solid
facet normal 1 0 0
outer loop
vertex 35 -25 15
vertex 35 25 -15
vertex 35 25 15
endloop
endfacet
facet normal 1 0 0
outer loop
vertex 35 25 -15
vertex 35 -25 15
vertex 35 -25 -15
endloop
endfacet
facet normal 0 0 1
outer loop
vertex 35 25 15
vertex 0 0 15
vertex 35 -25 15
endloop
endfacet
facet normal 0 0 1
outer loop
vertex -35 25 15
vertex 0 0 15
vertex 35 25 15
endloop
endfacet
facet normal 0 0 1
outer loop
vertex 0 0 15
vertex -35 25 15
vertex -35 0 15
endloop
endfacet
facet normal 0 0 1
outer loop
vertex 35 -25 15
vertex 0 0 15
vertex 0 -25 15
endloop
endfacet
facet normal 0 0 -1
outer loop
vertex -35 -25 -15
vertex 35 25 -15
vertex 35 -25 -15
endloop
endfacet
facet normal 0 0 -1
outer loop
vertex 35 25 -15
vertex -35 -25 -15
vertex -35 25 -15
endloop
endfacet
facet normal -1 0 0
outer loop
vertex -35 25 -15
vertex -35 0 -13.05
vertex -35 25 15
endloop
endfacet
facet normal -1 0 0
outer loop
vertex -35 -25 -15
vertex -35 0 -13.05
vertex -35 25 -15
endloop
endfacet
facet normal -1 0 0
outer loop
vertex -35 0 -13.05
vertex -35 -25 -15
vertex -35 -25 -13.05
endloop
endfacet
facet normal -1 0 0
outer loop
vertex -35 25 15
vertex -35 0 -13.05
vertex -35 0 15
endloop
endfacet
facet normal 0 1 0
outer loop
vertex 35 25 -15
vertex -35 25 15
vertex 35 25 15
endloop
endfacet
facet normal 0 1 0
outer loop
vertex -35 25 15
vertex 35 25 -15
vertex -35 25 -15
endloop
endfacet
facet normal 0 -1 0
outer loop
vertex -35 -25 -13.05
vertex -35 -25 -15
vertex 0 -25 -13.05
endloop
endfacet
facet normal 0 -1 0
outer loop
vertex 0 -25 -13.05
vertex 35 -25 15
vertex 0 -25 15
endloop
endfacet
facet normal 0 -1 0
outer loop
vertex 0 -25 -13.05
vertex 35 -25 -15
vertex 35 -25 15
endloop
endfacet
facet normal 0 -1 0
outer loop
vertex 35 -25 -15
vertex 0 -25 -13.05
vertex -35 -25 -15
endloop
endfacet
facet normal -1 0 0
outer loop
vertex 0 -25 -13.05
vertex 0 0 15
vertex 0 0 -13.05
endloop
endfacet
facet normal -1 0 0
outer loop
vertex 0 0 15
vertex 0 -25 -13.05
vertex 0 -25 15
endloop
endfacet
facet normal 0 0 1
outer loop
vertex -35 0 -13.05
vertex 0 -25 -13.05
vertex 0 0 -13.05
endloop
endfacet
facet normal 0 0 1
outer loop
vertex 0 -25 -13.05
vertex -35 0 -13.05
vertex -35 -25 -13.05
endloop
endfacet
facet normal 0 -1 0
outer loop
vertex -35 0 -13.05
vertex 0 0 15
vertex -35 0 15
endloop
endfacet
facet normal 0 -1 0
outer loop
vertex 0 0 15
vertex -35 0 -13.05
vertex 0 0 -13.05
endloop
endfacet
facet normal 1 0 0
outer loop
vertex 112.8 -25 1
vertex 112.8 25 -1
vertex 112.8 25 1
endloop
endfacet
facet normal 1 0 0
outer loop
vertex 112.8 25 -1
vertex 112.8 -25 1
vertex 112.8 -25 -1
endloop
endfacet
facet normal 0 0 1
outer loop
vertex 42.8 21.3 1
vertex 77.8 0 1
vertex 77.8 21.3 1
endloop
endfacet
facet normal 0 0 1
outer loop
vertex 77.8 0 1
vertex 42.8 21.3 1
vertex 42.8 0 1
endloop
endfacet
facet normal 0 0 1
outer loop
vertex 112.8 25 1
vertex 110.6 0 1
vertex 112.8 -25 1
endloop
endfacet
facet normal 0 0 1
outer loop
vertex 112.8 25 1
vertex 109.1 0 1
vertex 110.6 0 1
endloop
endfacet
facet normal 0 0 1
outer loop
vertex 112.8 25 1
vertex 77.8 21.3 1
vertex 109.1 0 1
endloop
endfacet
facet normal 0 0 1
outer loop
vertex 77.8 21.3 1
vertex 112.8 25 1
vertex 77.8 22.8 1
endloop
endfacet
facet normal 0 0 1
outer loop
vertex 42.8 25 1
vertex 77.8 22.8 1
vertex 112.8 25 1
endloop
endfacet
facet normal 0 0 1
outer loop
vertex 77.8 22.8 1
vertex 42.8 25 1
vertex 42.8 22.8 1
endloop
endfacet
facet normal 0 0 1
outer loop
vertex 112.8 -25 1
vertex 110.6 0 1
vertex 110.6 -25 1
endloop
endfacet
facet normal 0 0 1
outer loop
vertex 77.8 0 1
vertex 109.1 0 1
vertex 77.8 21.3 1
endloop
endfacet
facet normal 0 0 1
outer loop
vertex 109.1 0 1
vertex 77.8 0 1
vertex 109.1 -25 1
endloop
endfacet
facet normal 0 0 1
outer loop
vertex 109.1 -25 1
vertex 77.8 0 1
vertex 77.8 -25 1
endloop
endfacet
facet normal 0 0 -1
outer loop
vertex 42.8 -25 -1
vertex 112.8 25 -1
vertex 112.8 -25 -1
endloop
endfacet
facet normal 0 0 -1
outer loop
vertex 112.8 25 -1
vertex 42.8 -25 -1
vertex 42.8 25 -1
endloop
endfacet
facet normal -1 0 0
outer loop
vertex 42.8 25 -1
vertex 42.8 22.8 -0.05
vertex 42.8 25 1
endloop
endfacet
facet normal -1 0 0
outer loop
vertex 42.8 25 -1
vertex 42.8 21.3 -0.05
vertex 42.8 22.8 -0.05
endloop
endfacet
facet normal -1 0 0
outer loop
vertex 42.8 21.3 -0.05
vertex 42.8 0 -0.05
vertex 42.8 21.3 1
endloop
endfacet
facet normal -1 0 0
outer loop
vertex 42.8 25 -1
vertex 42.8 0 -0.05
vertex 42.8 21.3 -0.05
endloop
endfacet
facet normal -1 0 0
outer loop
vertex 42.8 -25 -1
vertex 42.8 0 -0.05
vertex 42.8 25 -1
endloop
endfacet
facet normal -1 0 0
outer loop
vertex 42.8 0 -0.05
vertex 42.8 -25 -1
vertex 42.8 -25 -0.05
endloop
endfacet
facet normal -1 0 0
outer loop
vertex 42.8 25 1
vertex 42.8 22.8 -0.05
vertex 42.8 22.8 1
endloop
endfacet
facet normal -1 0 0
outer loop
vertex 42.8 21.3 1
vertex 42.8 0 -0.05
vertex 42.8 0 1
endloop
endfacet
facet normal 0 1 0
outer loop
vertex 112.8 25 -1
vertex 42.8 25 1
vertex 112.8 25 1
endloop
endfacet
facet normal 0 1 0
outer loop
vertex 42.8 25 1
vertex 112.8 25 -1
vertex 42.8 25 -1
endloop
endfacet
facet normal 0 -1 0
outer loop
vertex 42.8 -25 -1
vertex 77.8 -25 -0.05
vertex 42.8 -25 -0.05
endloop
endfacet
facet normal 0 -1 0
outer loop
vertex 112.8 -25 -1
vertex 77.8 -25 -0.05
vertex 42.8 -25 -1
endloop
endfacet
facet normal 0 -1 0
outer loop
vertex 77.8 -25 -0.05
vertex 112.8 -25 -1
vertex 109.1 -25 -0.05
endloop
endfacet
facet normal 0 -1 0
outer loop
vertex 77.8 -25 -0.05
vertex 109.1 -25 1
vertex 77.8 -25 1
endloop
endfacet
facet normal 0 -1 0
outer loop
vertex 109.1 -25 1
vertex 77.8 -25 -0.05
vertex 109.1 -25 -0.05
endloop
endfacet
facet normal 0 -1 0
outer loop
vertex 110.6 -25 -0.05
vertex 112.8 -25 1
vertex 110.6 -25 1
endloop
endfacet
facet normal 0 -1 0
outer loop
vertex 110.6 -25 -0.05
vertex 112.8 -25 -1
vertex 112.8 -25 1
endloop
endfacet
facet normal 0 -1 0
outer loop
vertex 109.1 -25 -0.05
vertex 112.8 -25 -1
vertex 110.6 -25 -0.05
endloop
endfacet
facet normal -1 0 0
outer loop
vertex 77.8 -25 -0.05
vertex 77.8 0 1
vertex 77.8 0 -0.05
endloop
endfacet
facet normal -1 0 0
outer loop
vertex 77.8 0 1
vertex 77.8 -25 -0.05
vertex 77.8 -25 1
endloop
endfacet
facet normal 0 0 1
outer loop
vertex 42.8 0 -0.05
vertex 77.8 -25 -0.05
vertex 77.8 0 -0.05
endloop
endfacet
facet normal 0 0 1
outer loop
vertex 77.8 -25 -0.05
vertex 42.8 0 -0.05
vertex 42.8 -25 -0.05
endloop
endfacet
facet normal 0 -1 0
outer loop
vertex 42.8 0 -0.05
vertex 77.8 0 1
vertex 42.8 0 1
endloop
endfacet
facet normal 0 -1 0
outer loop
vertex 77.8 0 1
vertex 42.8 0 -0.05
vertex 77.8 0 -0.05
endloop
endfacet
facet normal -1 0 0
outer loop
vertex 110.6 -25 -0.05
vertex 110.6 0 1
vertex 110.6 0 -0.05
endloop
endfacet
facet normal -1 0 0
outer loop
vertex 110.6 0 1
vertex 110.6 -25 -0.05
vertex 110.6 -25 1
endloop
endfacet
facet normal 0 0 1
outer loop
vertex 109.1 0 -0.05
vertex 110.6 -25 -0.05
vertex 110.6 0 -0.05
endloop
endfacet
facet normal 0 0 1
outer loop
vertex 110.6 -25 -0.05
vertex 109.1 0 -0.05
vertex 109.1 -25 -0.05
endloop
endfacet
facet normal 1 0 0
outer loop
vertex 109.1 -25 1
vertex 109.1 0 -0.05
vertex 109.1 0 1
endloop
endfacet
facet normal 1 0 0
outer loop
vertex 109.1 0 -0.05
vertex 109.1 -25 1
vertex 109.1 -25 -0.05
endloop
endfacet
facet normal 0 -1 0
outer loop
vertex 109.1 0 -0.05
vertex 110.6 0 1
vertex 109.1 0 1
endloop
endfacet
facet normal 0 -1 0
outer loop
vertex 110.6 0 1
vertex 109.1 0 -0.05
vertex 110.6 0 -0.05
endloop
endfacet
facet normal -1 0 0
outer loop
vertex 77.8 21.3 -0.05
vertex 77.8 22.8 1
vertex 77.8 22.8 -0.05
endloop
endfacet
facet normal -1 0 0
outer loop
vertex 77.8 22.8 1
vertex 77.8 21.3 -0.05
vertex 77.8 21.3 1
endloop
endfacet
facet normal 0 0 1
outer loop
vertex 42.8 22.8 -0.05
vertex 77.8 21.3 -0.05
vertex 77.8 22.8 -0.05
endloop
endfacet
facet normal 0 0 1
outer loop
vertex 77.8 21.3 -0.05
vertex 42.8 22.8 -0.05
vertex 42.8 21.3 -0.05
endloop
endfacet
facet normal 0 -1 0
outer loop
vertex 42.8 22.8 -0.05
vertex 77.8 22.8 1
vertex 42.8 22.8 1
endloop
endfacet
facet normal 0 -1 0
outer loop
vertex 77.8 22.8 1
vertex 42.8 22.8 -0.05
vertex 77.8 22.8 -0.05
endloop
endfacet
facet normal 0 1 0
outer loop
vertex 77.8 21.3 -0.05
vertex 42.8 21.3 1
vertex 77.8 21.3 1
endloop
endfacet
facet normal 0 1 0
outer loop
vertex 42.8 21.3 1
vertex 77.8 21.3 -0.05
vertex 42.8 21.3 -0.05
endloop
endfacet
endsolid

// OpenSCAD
// Two-part enclosure for small electronics board
// Part 1: Box (left)
// Part 2: Lid (right, printed upside down)
// Prints together with a 10 mm gap.

$fn = 128;

// --- Dimensions ---

// Box Dimensions (Outer)
BOX_X = 70;
BOX_Y = 50;
BOX_Z = 30;

// Wall and Floor Thickness
WALL_THICK = 2;
FLOOR_THICK = 2;

// Gap between parts
PART_GAP = 10;

// Lid Dimensions
// Plate thickness
LID_PLATE_THICK = 2;
// Lip dimensions
LIP_WALL_THICK = 1.5;
LIP_HEIGHT = 4;
// Lip outer size (matches box opening + clearance)
LIP_X_OUT = 65.6;
LIP_Y_OUT = 45.6;

// --- Helper Functions ---

// Create the Box (Part 1)
// Oriented: Rests on XY, builds +Z. Centred on origin.
module create_box() {
    // Calculate inner dimensions
    inner_x = BOX_X - 2*WALL_THICK;
    inner_y = BOX_Y - 2*WALL_THICK;
    inner_z = BOX_Z - FLOOR_THICK; // Open top

    // Build box using difference to ensure clean walls
    difference() {
        // Outer block
        cube([BOX_X, BOX_Y, BOX_Z], center = true);
        
        // Cut out the inside (open top)
        // The hole goes from z=0 to z=inner_z relative to the box center.
        // Box center Z is BOX_Z/2.
        // Hole bottom Z = BOX_Z/2 - inner_z/2 = (BOX_Z - inner_z)/2 = FLOOR_THICK/2.
        // Hole top Z = BOX_Z/2 + inner_z/2.
        
        translate([
            -inner_x/2, 
            -inner_y/2, 
            FLOOR_THICK/2
        ]) {
            cube([inner_x, inner_y, inner_z + 0.1], center = true);
        }
    }
}

// Create the Lid (Part 2)
// Oriented: Printed upside down. 
// This means the plate lies on the bed (XY), and the lip extends UPWARDS (+Z) 
// so that when flipped, the lip goes down into the box.
module create_lid() {
    // Plate dimensions
    plate_x = BOX_X;
    plate_y = BOX_Y;
    plate_z = LID_PLATE_THICK;

    // Lip dimensions (Outer)
    lip_x_out = LIP_X_OUT;
    lip_y_out = LIP_Y_OUT;
    lip_z = LIP_HEIGHT;
    lip_w = LIP_WALL_THICK;

    // Lip Inner dimensions (to match the cutout)
    lip_x_in = lip_x_out - 2*lip_w;
    lip_y_in = lip_y_out - 2*lip_w;

    difference() {
        // 1. The main plate
        cube([plate_x, plate_y, plate_z], center = true);

        // 2. The Lip (cut out from the plate volume)
        // We subtract the volume of the lip channel.
        // The channel is defined by the inner void and the side walls.
        
        // Start cutting from the top surface of the plate
        cut_z_start = plate_z;
        
        // Inner Void (the hole)
        translate([
            -lip_x_in/2, 
            -lip_y_in/2, 
            cut_z_start
        ]) {
            cube([lip_x_in, lip_y_in, lip_z + 0.1], center = true);
        }
        
        // Side Walls (Left and Right relative to X)
        // Wall 1 (Left)
        translate([
            -lip_x_out/2 - lip_w/2, 
            -lip_y_out/2, 
            cut_z_start
        ]) {
            cube([lip_w, lip_y_out, lip_z + 0.1], center = true);
        }
        // Wall 2 (Right)
        translate([
            lip_x_out/2 - lip_w/2, 
            -lip_y_out/2, 
            cut_z_start
        ]) {
            cube([lip_w, lip_y_out, lip_z + 0.1], center = true);
        }
        
        // Side Walls (Front and Back relative to Y)
        // Wall 3 (Front)
        translate([
            -lip_x_out/2, 
            -lip_y_out/2 - lip_w/2, 
            cut_z_start
        ]) {
            cube([lip_x_out, lip_w, lip_z + 0.1], center = true);
        }
        // Wall 4 (Back)
        translate([
            -lip_x_out/2, 
            lip_y_out/2 - lip_w/2, 
            cut_z_start
        ]) {
            cube([lip_x_out, lip_w, lip_z + 0.1], center = true);
        }
    }
}

// --- Assembly ---

// Positioning:
// Box is centered at origin.
// Lid is placed on the +X side with a 10mm gap.
// Box center X = 0. Box right edge = 35.
// Gap = 10.
// Lid left edge should be at 35 + 10 = 45.
// Lid center X = 45 + (LIP_X_OUT / 2) = 45 + 32.8 = 77.8.

translate([0, 0, 0]) {
    create_box();
}

translate([
    BOX_X/2 + PART_GAP + LIP_X_OUT/2, 
    0, 
    0
]) {
    create_lid();
}
